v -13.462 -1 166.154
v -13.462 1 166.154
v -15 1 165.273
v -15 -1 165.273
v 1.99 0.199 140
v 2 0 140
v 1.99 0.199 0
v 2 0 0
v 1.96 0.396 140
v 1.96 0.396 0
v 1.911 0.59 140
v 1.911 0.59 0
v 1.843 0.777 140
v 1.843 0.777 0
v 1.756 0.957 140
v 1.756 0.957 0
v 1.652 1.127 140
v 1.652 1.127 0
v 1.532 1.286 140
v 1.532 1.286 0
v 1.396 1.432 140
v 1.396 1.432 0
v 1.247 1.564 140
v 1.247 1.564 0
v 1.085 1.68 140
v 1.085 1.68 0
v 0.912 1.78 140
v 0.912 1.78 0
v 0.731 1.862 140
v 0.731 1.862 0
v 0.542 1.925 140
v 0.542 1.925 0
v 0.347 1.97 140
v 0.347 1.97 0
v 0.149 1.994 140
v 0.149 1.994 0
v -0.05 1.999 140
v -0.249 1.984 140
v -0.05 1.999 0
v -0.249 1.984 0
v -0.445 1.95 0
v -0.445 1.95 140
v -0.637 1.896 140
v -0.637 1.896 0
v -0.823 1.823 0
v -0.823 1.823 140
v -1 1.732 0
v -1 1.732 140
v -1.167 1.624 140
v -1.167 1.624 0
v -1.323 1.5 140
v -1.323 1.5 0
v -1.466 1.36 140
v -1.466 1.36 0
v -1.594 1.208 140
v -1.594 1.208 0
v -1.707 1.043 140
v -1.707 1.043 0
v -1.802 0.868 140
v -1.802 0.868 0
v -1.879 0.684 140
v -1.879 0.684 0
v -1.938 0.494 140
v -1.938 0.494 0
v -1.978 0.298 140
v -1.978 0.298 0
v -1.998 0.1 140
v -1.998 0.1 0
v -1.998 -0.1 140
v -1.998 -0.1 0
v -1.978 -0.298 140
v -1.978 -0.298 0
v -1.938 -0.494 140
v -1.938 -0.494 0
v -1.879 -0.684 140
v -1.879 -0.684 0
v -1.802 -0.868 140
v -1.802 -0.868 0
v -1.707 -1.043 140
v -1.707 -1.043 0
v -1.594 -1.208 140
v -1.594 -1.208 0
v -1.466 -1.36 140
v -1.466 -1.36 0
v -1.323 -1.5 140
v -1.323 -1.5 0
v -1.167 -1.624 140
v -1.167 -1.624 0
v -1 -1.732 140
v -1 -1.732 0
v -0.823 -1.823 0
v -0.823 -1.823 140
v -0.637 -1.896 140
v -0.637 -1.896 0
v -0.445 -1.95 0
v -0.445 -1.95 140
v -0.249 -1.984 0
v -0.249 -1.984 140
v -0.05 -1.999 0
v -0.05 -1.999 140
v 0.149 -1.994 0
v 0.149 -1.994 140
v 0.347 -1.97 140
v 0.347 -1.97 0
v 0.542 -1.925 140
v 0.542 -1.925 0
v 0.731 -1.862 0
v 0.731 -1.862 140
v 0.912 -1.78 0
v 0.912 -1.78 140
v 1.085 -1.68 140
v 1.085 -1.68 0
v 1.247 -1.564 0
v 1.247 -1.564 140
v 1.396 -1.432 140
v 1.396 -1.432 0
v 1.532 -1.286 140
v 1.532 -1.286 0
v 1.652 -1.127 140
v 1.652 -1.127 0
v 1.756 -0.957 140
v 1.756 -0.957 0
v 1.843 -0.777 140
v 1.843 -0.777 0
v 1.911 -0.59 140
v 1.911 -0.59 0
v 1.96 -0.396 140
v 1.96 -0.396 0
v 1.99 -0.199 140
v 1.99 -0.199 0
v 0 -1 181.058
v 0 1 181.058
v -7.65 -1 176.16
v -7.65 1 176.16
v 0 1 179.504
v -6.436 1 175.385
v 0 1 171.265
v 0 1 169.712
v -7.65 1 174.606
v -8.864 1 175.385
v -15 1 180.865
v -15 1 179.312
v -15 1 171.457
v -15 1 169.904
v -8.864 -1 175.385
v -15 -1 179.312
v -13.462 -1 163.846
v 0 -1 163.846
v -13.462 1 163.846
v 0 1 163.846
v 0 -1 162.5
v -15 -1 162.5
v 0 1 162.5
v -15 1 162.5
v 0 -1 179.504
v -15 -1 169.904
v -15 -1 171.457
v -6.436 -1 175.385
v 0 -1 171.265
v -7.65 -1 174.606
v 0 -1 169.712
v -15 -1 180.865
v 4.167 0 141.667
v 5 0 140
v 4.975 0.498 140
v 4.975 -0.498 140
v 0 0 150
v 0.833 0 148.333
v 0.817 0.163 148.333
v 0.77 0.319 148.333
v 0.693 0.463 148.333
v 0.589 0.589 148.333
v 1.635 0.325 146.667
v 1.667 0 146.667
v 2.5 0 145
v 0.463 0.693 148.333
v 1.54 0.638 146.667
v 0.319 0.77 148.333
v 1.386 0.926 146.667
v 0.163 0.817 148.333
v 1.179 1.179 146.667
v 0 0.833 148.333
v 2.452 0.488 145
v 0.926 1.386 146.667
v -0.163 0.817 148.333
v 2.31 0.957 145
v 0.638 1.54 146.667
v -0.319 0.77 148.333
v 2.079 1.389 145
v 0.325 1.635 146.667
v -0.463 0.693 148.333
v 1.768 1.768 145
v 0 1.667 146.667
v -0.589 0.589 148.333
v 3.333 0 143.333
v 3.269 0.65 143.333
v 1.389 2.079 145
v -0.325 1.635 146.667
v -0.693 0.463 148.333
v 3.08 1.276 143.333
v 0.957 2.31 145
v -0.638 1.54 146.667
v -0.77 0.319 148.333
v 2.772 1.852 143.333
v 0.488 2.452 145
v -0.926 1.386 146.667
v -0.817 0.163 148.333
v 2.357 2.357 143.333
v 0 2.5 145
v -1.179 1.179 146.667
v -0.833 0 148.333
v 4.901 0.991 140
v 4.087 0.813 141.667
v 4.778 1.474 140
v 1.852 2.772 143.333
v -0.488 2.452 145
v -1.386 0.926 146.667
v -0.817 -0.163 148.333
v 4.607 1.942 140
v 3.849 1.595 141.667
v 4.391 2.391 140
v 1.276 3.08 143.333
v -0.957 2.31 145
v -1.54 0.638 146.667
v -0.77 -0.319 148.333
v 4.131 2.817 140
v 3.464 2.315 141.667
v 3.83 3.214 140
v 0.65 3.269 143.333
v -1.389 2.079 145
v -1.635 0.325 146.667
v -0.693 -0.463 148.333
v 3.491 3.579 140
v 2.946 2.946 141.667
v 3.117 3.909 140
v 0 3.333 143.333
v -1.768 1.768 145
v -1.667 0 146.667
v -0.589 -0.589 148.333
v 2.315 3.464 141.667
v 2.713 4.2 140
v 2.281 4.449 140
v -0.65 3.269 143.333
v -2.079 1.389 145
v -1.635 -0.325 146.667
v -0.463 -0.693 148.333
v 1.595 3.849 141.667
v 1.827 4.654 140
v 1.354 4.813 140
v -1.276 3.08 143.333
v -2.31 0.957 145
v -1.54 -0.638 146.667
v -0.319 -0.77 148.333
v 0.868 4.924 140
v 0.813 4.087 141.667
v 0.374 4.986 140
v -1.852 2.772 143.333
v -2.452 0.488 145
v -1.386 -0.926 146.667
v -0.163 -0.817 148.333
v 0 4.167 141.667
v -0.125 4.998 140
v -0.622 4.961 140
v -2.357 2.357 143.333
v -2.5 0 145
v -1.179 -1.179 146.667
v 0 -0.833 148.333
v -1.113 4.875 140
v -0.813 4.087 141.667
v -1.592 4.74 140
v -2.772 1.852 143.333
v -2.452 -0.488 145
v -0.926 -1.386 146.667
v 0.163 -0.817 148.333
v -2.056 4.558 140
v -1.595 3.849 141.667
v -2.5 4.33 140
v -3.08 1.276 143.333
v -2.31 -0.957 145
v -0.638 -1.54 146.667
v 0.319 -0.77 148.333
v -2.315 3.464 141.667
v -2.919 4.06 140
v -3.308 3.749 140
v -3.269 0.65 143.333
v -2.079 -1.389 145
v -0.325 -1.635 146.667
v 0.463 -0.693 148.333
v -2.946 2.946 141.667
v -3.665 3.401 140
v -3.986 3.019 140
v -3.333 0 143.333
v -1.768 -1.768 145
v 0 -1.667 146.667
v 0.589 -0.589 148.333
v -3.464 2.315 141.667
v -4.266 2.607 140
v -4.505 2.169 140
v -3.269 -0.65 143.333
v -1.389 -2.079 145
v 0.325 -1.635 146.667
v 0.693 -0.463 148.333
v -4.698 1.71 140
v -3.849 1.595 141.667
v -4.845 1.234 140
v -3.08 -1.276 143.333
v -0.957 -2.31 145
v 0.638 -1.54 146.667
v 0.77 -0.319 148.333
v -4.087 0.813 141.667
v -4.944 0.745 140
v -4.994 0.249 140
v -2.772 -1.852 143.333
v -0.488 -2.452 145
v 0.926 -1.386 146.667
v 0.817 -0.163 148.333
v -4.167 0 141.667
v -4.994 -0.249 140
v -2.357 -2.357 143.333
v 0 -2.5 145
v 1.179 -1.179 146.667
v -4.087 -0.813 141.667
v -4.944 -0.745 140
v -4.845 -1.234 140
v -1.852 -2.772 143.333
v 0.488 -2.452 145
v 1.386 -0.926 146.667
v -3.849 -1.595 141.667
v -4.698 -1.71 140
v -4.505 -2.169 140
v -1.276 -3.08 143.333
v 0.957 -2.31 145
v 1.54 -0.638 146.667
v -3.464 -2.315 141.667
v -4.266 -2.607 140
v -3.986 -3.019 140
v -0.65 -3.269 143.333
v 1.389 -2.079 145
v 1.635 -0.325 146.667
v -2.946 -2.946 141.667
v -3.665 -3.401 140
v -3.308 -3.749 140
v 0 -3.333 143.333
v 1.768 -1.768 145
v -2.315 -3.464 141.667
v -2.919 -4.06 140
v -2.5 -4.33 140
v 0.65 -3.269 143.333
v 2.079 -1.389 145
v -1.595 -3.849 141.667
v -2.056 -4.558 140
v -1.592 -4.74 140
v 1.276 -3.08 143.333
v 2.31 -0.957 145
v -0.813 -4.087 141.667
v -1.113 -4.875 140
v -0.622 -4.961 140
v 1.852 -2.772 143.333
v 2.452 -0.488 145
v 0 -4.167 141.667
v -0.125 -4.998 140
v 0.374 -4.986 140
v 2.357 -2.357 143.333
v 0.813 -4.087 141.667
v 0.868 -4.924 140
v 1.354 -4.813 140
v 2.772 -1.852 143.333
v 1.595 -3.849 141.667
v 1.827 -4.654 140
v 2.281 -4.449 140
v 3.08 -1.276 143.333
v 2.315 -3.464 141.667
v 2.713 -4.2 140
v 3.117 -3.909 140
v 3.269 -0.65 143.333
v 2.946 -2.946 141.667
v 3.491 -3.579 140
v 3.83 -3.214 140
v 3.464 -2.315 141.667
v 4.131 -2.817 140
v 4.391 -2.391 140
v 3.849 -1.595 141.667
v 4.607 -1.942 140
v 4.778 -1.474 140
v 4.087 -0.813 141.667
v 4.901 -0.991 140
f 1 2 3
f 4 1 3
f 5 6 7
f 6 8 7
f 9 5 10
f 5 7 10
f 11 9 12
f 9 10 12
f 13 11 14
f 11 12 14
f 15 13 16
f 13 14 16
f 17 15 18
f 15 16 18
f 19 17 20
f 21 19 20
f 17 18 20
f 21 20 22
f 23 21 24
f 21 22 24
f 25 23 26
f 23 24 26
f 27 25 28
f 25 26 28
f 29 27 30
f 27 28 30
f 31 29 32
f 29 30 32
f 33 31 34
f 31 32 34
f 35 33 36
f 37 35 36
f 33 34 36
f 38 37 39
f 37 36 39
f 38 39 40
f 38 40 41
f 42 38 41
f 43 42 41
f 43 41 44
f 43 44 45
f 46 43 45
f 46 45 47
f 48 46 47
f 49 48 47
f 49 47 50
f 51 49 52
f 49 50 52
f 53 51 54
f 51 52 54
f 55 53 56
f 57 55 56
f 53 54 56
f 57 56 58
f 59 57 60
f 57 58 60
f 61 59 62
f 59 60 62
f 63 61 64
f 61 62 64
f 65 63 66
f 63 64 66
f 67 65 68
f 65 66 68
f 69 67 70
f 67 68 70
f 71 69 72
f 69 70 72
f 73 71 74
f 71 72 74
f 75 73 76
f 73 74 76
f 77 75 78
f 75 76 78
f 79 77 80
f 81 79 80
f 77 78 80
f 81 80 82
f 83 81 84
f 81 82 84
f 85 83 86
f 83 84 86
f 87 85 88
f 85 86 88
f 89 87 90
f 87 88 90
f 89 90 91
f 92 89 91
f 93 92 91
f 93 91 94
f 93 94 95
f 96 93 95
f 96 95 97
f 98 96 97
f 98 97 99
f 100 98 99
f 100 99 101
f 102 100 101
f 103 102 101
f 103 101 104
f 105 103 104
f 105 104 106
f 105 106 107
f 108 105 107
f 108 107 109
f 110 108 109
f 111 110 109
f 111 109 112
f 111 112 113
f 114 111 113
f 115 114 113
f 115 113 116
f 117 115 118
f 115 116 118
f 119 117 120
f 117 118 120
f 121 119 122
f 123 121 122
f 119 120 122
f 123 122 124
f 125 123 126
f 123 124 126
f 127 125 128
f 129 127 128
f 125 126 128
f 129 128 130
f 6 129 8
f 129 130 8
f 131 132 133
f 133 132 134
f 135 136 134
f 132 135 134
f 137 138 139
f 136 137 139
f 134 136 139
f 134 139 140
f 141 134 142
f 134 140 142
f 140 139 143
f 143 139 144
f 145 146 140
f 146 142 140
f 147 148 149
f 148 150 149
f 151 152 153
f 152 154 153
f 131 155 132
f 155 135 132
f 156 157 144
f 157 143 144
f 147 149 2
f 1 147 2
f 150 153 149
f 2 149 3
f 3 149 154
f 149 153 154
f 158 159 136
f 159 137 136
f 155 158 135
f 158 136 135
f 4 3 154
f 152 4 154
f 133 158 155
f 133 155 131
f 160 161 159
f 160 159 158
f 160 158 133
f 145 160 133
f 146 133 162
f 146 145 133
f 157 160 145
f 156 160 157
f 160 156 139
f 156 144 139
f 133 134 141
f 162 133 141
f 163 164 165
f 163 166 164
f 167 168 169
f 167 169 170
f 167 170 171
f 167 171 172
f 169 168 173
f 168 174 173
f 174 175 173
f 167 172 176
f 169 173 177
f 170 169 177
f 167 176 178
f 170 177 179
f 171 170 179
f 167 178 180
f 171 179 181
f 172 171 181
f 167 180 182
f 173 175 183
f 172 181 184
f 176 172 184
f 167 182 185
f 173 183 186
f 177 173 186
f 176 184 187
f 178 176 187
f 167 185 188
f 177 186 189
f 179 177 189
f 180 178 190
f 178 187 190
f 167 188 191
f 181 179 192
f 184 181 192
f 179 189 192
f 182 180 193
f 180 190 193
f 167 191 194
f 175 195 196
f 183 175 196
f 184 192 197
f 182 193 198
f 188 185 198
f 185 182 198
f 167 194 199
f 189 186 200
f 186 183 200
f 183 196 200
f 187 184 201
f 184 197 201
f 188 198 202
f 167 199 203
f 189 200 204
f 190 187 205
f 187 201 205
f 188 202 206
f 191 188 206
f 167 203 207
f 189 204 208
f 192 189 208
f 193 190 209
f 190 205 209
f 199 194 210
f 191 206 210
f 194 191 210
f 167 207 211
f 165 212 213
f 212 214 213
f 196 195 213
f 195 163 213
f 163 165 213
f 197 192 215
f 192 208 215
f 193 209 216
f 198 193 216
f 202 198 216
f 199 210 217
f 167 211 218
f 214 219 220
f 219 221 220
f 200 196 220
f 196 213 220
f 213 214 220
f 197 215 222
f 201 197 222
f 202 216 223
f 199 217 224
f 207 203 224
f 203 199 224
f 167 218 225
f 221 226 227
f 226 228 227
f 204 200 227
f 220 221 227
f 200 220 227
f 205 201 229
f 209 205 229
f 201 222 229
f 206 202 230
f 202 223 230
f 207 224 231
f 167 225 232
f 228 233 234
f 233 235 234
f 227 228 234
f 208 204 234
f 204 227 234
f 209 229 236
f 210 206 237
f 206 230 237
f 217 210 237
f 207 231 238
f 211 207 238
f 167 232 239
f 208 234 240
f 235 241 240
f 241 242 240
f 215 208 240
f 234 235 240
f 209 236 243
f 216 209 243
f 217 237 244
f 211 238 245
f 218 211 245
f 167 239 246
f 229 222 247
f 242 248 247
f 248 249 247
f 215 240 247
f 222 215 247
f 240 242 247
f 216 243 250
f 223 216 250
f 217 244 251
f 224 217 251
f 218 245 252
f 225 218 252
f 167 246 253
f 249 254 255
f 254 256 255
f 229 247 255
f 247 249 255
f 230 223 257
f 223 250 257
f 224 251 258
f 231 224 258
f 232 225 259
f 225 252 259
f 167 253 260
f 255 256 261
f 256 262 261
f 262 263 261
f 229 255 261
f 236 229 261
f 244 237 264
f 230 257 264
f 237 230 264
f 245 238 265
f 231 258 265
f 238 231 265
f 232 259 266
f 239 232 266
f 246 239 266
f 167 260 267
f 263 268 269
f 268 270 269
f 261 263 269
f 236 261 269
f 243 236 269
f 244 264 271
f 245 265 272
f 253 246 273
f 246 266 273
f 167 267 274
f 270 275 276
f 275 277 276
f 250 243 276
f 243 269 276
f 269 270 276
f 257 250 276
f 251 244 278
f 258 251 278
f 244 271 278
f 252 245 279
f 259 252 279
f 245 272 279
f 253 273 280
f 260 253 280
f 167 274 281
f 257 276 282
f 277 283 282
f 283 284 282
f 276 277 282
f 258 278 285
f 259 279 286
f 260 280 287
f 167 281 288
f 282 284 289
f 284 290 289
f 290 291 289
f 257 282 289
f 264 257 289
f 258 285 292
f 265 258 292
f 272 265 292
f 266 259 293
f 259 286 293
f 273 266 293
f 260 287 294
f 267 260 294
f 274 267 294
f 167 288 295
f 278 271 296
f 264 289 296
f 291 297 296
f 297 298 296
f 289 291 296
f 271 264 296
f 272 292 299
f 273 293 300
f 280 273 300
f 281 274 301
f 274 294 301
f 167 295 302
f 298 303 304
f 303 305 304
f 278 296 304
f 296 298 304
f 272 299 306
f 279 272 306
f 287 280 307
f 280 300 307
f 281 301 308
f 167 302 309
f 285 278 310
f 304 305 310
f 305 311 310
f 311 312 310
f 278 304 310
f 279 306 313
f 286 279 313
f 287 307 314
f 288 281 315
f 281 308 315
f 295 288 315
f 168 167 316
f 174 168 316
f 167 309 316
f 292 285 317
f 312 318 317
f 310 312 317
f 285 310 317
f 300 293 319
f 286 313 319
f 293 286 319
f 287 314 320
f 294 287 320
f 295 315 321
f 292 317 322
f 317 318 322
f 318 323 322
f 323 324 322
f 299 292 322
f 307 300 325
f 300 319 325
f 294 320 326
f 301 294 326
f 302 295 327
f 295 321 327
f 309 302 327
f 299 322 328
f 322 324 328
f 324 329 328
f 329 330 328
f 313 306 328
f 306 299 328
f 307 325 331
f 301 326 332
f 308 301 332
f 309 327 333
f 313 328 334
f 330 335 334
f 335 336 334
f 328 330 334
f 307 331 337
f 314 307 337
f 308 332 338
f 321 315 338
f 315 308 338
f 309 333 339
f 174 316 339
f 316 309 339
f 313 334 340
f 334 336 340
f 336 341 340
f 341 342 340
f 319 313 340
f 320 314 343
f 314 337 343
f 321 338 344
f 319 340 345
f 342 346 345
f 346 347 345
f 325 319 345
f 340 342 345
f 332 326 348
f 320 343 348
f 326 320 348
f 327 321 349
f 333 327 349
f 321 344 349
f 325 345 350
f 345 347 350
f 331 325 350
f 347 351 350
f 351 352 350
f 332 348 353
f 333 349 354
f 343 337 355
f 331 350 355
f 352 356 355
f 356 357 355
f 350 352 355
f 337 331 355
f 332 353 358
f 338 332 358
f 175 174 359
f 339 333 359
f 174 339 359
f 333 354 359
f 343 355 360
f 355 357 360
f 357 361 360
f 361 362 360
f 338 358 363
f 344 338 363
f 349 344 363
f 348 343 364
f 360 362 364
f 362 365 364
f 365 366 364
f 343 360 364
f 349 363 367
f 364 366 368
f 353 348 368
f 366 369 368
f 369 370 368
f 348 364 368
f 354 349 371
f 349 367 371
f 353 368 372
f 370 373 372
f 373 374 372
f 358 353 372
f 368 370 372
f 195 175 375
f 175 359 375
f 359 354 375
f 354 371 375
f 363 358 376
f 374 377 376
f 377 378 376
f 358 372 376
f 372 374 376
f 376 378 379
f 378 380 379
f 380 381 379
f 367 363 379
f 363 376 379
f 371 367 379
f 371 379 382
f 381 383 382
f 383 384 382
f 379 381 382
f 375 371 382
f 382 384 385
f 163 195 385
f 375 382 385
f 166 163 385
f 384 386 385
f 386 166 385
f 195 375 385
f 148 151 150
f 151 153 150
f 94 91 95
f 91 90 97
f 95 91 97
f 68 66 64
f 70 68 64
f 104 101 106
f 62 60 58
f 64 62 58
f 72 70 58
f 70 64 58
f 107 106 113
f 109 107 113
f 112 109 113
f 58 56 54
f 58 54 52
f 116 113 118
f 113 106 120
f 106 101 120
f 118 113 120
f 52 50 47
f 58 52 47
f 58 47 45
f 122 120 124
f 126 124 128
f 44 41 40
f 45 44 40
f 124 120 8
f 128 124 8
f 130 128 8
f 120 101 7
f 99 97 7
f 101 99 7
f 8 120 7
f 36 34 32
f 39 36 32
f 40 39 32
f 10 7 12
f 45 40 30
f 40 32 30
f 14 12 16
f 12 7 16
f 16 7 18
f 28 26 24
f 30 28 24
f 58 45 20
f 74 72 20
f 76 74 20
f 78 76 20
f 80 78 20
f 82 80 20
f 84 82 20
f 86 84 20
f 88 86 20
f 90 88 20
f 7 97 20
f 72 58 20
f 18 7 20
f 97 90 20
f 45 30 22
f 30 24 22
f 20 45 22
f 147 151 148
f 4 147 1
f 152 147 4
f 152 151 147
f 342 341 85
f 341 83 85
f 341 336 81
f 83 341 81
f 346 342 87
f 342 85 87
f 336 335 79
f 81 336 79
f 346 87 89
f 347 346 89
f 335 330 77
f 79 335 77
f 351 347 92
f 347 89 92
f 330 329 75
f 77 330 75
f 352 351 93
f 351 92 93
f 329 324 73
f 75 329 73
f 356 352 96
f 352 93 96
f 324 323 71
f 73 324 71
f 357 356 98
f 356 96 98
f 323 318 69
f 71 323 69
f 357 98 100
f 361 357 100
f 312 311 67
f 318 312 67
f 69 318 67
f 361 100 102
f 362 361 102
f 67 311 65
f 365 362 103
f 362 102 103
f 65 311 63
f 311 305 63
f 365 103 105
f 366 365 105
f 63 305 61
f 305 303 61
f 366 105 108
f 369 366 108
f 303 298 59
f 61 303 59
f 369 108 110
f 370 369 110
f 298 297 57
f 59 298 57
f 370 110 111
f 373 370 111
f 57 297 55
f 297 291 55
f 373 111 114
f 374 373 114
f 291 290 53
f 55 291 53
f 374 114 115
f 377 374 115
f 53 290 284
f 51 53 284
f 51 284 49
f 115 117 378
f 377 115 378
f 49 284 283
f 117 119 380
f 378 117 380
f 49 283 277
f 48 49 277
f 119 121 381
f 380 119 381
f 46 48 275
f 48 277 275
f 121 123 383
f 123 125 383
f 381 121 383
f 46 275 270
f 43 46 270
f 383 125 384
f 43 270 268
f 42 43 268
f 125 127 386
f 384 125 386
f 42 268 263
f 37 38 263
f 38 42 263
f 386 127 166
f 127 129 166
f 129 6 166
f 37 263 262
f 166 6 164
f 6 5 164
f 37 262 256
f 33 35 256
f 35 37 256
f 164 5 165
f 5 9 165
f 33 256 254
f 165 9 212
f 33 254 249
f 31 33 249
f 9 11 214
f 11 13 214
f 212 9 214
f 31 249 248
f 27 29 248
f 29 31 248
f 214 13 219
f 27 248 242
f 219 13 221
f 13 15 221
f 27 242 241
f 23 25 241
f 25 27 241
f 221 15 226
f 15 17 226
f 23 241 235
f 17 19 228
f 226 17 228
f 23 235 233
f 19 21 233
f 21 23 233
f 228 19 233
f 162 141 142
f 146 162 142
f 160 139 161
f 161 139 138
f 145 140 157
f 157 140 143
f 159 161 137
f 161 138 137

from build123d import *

# Parameters (mm, degrees)
BOSS_EXTRUDE1_DEPTH        = 1
BOSS_EXTRUDE1_DEPTH_BACK   = 1
BOSS_EXTRUDE1_2_DEPTH      = 1
BOSS_EXTRUDE1_2_DEPTH_BACK = 1


with BuildPart() as part:
    # Sketch2 → Revolve1 (revolve)
    with BuildSketch(Plane(origin=(0, 0, 0), x_dir=(1, 0, 0), z_dir=(0, 1, 0))):
        Polygon((0, -150), (5, -140), (2, -140), (2, 0), (0, 0), align=None)
    revolve(axis=Axis((0, 0, -41.949952025), (0, 0, 1)))


with BuildPart() as body_2:
    # Sketch3 → Boss-Extrude1 (new, two sides: drawn at the far end of the back side and taken through both)
    with BuildSketch(Plane(origin=(0, 0, 0), x_dir=(1, 0, 0), z_dir=(0, 1, 0)).offset(-BOSS_EXTRUDE1_DEPTH_BACK)):
        Polygon((-15, -165.2734375), (-15, -162.5), (0, -162.5), (0, -163.846153846), (-13.461538462, -163.846153846), (-13.461538462, -166.153846154), align=None)
    extrude(amount=BOSS_EXTRUDE1_DEPTH + BOSS_EXTRUDE1_DEPTH_BACK)


with BuildPart() as body_3:
    # Sketch3 → Boss-Extrude1 2 (new, two sides: drawn at the far end of the back side and taken through both)
    with BuildSketch(Plane(origin=(0, 0, 0), x_dir=(1, 0, 0), z_dir=(0, 1, 0)).offset(-BOSS_EXTRUDE1_2_DEPTH_BACK)):
        Polygon((-15, -180.865384615), (-15, -179.311899038), (-8.864182692, -175.384615385), (-15, -171.457331731), (-15, -169.903846154), (-7.650240385, -174.606370192), (0, -169.711538462), (0, -171.265024038), (-6.436298077, -175.384615385), (0, -179.504206731), (0, -181.057692308), (-7.650240385, -176.159855769), align=None)
    extrude(amount=BOSS_EXTRUDE1_2_DEPTH + BOSS_EXTRUDE1_2_DEPTH_BACK)


solid = Compound([part.part, body_2.part, body_3.part])
